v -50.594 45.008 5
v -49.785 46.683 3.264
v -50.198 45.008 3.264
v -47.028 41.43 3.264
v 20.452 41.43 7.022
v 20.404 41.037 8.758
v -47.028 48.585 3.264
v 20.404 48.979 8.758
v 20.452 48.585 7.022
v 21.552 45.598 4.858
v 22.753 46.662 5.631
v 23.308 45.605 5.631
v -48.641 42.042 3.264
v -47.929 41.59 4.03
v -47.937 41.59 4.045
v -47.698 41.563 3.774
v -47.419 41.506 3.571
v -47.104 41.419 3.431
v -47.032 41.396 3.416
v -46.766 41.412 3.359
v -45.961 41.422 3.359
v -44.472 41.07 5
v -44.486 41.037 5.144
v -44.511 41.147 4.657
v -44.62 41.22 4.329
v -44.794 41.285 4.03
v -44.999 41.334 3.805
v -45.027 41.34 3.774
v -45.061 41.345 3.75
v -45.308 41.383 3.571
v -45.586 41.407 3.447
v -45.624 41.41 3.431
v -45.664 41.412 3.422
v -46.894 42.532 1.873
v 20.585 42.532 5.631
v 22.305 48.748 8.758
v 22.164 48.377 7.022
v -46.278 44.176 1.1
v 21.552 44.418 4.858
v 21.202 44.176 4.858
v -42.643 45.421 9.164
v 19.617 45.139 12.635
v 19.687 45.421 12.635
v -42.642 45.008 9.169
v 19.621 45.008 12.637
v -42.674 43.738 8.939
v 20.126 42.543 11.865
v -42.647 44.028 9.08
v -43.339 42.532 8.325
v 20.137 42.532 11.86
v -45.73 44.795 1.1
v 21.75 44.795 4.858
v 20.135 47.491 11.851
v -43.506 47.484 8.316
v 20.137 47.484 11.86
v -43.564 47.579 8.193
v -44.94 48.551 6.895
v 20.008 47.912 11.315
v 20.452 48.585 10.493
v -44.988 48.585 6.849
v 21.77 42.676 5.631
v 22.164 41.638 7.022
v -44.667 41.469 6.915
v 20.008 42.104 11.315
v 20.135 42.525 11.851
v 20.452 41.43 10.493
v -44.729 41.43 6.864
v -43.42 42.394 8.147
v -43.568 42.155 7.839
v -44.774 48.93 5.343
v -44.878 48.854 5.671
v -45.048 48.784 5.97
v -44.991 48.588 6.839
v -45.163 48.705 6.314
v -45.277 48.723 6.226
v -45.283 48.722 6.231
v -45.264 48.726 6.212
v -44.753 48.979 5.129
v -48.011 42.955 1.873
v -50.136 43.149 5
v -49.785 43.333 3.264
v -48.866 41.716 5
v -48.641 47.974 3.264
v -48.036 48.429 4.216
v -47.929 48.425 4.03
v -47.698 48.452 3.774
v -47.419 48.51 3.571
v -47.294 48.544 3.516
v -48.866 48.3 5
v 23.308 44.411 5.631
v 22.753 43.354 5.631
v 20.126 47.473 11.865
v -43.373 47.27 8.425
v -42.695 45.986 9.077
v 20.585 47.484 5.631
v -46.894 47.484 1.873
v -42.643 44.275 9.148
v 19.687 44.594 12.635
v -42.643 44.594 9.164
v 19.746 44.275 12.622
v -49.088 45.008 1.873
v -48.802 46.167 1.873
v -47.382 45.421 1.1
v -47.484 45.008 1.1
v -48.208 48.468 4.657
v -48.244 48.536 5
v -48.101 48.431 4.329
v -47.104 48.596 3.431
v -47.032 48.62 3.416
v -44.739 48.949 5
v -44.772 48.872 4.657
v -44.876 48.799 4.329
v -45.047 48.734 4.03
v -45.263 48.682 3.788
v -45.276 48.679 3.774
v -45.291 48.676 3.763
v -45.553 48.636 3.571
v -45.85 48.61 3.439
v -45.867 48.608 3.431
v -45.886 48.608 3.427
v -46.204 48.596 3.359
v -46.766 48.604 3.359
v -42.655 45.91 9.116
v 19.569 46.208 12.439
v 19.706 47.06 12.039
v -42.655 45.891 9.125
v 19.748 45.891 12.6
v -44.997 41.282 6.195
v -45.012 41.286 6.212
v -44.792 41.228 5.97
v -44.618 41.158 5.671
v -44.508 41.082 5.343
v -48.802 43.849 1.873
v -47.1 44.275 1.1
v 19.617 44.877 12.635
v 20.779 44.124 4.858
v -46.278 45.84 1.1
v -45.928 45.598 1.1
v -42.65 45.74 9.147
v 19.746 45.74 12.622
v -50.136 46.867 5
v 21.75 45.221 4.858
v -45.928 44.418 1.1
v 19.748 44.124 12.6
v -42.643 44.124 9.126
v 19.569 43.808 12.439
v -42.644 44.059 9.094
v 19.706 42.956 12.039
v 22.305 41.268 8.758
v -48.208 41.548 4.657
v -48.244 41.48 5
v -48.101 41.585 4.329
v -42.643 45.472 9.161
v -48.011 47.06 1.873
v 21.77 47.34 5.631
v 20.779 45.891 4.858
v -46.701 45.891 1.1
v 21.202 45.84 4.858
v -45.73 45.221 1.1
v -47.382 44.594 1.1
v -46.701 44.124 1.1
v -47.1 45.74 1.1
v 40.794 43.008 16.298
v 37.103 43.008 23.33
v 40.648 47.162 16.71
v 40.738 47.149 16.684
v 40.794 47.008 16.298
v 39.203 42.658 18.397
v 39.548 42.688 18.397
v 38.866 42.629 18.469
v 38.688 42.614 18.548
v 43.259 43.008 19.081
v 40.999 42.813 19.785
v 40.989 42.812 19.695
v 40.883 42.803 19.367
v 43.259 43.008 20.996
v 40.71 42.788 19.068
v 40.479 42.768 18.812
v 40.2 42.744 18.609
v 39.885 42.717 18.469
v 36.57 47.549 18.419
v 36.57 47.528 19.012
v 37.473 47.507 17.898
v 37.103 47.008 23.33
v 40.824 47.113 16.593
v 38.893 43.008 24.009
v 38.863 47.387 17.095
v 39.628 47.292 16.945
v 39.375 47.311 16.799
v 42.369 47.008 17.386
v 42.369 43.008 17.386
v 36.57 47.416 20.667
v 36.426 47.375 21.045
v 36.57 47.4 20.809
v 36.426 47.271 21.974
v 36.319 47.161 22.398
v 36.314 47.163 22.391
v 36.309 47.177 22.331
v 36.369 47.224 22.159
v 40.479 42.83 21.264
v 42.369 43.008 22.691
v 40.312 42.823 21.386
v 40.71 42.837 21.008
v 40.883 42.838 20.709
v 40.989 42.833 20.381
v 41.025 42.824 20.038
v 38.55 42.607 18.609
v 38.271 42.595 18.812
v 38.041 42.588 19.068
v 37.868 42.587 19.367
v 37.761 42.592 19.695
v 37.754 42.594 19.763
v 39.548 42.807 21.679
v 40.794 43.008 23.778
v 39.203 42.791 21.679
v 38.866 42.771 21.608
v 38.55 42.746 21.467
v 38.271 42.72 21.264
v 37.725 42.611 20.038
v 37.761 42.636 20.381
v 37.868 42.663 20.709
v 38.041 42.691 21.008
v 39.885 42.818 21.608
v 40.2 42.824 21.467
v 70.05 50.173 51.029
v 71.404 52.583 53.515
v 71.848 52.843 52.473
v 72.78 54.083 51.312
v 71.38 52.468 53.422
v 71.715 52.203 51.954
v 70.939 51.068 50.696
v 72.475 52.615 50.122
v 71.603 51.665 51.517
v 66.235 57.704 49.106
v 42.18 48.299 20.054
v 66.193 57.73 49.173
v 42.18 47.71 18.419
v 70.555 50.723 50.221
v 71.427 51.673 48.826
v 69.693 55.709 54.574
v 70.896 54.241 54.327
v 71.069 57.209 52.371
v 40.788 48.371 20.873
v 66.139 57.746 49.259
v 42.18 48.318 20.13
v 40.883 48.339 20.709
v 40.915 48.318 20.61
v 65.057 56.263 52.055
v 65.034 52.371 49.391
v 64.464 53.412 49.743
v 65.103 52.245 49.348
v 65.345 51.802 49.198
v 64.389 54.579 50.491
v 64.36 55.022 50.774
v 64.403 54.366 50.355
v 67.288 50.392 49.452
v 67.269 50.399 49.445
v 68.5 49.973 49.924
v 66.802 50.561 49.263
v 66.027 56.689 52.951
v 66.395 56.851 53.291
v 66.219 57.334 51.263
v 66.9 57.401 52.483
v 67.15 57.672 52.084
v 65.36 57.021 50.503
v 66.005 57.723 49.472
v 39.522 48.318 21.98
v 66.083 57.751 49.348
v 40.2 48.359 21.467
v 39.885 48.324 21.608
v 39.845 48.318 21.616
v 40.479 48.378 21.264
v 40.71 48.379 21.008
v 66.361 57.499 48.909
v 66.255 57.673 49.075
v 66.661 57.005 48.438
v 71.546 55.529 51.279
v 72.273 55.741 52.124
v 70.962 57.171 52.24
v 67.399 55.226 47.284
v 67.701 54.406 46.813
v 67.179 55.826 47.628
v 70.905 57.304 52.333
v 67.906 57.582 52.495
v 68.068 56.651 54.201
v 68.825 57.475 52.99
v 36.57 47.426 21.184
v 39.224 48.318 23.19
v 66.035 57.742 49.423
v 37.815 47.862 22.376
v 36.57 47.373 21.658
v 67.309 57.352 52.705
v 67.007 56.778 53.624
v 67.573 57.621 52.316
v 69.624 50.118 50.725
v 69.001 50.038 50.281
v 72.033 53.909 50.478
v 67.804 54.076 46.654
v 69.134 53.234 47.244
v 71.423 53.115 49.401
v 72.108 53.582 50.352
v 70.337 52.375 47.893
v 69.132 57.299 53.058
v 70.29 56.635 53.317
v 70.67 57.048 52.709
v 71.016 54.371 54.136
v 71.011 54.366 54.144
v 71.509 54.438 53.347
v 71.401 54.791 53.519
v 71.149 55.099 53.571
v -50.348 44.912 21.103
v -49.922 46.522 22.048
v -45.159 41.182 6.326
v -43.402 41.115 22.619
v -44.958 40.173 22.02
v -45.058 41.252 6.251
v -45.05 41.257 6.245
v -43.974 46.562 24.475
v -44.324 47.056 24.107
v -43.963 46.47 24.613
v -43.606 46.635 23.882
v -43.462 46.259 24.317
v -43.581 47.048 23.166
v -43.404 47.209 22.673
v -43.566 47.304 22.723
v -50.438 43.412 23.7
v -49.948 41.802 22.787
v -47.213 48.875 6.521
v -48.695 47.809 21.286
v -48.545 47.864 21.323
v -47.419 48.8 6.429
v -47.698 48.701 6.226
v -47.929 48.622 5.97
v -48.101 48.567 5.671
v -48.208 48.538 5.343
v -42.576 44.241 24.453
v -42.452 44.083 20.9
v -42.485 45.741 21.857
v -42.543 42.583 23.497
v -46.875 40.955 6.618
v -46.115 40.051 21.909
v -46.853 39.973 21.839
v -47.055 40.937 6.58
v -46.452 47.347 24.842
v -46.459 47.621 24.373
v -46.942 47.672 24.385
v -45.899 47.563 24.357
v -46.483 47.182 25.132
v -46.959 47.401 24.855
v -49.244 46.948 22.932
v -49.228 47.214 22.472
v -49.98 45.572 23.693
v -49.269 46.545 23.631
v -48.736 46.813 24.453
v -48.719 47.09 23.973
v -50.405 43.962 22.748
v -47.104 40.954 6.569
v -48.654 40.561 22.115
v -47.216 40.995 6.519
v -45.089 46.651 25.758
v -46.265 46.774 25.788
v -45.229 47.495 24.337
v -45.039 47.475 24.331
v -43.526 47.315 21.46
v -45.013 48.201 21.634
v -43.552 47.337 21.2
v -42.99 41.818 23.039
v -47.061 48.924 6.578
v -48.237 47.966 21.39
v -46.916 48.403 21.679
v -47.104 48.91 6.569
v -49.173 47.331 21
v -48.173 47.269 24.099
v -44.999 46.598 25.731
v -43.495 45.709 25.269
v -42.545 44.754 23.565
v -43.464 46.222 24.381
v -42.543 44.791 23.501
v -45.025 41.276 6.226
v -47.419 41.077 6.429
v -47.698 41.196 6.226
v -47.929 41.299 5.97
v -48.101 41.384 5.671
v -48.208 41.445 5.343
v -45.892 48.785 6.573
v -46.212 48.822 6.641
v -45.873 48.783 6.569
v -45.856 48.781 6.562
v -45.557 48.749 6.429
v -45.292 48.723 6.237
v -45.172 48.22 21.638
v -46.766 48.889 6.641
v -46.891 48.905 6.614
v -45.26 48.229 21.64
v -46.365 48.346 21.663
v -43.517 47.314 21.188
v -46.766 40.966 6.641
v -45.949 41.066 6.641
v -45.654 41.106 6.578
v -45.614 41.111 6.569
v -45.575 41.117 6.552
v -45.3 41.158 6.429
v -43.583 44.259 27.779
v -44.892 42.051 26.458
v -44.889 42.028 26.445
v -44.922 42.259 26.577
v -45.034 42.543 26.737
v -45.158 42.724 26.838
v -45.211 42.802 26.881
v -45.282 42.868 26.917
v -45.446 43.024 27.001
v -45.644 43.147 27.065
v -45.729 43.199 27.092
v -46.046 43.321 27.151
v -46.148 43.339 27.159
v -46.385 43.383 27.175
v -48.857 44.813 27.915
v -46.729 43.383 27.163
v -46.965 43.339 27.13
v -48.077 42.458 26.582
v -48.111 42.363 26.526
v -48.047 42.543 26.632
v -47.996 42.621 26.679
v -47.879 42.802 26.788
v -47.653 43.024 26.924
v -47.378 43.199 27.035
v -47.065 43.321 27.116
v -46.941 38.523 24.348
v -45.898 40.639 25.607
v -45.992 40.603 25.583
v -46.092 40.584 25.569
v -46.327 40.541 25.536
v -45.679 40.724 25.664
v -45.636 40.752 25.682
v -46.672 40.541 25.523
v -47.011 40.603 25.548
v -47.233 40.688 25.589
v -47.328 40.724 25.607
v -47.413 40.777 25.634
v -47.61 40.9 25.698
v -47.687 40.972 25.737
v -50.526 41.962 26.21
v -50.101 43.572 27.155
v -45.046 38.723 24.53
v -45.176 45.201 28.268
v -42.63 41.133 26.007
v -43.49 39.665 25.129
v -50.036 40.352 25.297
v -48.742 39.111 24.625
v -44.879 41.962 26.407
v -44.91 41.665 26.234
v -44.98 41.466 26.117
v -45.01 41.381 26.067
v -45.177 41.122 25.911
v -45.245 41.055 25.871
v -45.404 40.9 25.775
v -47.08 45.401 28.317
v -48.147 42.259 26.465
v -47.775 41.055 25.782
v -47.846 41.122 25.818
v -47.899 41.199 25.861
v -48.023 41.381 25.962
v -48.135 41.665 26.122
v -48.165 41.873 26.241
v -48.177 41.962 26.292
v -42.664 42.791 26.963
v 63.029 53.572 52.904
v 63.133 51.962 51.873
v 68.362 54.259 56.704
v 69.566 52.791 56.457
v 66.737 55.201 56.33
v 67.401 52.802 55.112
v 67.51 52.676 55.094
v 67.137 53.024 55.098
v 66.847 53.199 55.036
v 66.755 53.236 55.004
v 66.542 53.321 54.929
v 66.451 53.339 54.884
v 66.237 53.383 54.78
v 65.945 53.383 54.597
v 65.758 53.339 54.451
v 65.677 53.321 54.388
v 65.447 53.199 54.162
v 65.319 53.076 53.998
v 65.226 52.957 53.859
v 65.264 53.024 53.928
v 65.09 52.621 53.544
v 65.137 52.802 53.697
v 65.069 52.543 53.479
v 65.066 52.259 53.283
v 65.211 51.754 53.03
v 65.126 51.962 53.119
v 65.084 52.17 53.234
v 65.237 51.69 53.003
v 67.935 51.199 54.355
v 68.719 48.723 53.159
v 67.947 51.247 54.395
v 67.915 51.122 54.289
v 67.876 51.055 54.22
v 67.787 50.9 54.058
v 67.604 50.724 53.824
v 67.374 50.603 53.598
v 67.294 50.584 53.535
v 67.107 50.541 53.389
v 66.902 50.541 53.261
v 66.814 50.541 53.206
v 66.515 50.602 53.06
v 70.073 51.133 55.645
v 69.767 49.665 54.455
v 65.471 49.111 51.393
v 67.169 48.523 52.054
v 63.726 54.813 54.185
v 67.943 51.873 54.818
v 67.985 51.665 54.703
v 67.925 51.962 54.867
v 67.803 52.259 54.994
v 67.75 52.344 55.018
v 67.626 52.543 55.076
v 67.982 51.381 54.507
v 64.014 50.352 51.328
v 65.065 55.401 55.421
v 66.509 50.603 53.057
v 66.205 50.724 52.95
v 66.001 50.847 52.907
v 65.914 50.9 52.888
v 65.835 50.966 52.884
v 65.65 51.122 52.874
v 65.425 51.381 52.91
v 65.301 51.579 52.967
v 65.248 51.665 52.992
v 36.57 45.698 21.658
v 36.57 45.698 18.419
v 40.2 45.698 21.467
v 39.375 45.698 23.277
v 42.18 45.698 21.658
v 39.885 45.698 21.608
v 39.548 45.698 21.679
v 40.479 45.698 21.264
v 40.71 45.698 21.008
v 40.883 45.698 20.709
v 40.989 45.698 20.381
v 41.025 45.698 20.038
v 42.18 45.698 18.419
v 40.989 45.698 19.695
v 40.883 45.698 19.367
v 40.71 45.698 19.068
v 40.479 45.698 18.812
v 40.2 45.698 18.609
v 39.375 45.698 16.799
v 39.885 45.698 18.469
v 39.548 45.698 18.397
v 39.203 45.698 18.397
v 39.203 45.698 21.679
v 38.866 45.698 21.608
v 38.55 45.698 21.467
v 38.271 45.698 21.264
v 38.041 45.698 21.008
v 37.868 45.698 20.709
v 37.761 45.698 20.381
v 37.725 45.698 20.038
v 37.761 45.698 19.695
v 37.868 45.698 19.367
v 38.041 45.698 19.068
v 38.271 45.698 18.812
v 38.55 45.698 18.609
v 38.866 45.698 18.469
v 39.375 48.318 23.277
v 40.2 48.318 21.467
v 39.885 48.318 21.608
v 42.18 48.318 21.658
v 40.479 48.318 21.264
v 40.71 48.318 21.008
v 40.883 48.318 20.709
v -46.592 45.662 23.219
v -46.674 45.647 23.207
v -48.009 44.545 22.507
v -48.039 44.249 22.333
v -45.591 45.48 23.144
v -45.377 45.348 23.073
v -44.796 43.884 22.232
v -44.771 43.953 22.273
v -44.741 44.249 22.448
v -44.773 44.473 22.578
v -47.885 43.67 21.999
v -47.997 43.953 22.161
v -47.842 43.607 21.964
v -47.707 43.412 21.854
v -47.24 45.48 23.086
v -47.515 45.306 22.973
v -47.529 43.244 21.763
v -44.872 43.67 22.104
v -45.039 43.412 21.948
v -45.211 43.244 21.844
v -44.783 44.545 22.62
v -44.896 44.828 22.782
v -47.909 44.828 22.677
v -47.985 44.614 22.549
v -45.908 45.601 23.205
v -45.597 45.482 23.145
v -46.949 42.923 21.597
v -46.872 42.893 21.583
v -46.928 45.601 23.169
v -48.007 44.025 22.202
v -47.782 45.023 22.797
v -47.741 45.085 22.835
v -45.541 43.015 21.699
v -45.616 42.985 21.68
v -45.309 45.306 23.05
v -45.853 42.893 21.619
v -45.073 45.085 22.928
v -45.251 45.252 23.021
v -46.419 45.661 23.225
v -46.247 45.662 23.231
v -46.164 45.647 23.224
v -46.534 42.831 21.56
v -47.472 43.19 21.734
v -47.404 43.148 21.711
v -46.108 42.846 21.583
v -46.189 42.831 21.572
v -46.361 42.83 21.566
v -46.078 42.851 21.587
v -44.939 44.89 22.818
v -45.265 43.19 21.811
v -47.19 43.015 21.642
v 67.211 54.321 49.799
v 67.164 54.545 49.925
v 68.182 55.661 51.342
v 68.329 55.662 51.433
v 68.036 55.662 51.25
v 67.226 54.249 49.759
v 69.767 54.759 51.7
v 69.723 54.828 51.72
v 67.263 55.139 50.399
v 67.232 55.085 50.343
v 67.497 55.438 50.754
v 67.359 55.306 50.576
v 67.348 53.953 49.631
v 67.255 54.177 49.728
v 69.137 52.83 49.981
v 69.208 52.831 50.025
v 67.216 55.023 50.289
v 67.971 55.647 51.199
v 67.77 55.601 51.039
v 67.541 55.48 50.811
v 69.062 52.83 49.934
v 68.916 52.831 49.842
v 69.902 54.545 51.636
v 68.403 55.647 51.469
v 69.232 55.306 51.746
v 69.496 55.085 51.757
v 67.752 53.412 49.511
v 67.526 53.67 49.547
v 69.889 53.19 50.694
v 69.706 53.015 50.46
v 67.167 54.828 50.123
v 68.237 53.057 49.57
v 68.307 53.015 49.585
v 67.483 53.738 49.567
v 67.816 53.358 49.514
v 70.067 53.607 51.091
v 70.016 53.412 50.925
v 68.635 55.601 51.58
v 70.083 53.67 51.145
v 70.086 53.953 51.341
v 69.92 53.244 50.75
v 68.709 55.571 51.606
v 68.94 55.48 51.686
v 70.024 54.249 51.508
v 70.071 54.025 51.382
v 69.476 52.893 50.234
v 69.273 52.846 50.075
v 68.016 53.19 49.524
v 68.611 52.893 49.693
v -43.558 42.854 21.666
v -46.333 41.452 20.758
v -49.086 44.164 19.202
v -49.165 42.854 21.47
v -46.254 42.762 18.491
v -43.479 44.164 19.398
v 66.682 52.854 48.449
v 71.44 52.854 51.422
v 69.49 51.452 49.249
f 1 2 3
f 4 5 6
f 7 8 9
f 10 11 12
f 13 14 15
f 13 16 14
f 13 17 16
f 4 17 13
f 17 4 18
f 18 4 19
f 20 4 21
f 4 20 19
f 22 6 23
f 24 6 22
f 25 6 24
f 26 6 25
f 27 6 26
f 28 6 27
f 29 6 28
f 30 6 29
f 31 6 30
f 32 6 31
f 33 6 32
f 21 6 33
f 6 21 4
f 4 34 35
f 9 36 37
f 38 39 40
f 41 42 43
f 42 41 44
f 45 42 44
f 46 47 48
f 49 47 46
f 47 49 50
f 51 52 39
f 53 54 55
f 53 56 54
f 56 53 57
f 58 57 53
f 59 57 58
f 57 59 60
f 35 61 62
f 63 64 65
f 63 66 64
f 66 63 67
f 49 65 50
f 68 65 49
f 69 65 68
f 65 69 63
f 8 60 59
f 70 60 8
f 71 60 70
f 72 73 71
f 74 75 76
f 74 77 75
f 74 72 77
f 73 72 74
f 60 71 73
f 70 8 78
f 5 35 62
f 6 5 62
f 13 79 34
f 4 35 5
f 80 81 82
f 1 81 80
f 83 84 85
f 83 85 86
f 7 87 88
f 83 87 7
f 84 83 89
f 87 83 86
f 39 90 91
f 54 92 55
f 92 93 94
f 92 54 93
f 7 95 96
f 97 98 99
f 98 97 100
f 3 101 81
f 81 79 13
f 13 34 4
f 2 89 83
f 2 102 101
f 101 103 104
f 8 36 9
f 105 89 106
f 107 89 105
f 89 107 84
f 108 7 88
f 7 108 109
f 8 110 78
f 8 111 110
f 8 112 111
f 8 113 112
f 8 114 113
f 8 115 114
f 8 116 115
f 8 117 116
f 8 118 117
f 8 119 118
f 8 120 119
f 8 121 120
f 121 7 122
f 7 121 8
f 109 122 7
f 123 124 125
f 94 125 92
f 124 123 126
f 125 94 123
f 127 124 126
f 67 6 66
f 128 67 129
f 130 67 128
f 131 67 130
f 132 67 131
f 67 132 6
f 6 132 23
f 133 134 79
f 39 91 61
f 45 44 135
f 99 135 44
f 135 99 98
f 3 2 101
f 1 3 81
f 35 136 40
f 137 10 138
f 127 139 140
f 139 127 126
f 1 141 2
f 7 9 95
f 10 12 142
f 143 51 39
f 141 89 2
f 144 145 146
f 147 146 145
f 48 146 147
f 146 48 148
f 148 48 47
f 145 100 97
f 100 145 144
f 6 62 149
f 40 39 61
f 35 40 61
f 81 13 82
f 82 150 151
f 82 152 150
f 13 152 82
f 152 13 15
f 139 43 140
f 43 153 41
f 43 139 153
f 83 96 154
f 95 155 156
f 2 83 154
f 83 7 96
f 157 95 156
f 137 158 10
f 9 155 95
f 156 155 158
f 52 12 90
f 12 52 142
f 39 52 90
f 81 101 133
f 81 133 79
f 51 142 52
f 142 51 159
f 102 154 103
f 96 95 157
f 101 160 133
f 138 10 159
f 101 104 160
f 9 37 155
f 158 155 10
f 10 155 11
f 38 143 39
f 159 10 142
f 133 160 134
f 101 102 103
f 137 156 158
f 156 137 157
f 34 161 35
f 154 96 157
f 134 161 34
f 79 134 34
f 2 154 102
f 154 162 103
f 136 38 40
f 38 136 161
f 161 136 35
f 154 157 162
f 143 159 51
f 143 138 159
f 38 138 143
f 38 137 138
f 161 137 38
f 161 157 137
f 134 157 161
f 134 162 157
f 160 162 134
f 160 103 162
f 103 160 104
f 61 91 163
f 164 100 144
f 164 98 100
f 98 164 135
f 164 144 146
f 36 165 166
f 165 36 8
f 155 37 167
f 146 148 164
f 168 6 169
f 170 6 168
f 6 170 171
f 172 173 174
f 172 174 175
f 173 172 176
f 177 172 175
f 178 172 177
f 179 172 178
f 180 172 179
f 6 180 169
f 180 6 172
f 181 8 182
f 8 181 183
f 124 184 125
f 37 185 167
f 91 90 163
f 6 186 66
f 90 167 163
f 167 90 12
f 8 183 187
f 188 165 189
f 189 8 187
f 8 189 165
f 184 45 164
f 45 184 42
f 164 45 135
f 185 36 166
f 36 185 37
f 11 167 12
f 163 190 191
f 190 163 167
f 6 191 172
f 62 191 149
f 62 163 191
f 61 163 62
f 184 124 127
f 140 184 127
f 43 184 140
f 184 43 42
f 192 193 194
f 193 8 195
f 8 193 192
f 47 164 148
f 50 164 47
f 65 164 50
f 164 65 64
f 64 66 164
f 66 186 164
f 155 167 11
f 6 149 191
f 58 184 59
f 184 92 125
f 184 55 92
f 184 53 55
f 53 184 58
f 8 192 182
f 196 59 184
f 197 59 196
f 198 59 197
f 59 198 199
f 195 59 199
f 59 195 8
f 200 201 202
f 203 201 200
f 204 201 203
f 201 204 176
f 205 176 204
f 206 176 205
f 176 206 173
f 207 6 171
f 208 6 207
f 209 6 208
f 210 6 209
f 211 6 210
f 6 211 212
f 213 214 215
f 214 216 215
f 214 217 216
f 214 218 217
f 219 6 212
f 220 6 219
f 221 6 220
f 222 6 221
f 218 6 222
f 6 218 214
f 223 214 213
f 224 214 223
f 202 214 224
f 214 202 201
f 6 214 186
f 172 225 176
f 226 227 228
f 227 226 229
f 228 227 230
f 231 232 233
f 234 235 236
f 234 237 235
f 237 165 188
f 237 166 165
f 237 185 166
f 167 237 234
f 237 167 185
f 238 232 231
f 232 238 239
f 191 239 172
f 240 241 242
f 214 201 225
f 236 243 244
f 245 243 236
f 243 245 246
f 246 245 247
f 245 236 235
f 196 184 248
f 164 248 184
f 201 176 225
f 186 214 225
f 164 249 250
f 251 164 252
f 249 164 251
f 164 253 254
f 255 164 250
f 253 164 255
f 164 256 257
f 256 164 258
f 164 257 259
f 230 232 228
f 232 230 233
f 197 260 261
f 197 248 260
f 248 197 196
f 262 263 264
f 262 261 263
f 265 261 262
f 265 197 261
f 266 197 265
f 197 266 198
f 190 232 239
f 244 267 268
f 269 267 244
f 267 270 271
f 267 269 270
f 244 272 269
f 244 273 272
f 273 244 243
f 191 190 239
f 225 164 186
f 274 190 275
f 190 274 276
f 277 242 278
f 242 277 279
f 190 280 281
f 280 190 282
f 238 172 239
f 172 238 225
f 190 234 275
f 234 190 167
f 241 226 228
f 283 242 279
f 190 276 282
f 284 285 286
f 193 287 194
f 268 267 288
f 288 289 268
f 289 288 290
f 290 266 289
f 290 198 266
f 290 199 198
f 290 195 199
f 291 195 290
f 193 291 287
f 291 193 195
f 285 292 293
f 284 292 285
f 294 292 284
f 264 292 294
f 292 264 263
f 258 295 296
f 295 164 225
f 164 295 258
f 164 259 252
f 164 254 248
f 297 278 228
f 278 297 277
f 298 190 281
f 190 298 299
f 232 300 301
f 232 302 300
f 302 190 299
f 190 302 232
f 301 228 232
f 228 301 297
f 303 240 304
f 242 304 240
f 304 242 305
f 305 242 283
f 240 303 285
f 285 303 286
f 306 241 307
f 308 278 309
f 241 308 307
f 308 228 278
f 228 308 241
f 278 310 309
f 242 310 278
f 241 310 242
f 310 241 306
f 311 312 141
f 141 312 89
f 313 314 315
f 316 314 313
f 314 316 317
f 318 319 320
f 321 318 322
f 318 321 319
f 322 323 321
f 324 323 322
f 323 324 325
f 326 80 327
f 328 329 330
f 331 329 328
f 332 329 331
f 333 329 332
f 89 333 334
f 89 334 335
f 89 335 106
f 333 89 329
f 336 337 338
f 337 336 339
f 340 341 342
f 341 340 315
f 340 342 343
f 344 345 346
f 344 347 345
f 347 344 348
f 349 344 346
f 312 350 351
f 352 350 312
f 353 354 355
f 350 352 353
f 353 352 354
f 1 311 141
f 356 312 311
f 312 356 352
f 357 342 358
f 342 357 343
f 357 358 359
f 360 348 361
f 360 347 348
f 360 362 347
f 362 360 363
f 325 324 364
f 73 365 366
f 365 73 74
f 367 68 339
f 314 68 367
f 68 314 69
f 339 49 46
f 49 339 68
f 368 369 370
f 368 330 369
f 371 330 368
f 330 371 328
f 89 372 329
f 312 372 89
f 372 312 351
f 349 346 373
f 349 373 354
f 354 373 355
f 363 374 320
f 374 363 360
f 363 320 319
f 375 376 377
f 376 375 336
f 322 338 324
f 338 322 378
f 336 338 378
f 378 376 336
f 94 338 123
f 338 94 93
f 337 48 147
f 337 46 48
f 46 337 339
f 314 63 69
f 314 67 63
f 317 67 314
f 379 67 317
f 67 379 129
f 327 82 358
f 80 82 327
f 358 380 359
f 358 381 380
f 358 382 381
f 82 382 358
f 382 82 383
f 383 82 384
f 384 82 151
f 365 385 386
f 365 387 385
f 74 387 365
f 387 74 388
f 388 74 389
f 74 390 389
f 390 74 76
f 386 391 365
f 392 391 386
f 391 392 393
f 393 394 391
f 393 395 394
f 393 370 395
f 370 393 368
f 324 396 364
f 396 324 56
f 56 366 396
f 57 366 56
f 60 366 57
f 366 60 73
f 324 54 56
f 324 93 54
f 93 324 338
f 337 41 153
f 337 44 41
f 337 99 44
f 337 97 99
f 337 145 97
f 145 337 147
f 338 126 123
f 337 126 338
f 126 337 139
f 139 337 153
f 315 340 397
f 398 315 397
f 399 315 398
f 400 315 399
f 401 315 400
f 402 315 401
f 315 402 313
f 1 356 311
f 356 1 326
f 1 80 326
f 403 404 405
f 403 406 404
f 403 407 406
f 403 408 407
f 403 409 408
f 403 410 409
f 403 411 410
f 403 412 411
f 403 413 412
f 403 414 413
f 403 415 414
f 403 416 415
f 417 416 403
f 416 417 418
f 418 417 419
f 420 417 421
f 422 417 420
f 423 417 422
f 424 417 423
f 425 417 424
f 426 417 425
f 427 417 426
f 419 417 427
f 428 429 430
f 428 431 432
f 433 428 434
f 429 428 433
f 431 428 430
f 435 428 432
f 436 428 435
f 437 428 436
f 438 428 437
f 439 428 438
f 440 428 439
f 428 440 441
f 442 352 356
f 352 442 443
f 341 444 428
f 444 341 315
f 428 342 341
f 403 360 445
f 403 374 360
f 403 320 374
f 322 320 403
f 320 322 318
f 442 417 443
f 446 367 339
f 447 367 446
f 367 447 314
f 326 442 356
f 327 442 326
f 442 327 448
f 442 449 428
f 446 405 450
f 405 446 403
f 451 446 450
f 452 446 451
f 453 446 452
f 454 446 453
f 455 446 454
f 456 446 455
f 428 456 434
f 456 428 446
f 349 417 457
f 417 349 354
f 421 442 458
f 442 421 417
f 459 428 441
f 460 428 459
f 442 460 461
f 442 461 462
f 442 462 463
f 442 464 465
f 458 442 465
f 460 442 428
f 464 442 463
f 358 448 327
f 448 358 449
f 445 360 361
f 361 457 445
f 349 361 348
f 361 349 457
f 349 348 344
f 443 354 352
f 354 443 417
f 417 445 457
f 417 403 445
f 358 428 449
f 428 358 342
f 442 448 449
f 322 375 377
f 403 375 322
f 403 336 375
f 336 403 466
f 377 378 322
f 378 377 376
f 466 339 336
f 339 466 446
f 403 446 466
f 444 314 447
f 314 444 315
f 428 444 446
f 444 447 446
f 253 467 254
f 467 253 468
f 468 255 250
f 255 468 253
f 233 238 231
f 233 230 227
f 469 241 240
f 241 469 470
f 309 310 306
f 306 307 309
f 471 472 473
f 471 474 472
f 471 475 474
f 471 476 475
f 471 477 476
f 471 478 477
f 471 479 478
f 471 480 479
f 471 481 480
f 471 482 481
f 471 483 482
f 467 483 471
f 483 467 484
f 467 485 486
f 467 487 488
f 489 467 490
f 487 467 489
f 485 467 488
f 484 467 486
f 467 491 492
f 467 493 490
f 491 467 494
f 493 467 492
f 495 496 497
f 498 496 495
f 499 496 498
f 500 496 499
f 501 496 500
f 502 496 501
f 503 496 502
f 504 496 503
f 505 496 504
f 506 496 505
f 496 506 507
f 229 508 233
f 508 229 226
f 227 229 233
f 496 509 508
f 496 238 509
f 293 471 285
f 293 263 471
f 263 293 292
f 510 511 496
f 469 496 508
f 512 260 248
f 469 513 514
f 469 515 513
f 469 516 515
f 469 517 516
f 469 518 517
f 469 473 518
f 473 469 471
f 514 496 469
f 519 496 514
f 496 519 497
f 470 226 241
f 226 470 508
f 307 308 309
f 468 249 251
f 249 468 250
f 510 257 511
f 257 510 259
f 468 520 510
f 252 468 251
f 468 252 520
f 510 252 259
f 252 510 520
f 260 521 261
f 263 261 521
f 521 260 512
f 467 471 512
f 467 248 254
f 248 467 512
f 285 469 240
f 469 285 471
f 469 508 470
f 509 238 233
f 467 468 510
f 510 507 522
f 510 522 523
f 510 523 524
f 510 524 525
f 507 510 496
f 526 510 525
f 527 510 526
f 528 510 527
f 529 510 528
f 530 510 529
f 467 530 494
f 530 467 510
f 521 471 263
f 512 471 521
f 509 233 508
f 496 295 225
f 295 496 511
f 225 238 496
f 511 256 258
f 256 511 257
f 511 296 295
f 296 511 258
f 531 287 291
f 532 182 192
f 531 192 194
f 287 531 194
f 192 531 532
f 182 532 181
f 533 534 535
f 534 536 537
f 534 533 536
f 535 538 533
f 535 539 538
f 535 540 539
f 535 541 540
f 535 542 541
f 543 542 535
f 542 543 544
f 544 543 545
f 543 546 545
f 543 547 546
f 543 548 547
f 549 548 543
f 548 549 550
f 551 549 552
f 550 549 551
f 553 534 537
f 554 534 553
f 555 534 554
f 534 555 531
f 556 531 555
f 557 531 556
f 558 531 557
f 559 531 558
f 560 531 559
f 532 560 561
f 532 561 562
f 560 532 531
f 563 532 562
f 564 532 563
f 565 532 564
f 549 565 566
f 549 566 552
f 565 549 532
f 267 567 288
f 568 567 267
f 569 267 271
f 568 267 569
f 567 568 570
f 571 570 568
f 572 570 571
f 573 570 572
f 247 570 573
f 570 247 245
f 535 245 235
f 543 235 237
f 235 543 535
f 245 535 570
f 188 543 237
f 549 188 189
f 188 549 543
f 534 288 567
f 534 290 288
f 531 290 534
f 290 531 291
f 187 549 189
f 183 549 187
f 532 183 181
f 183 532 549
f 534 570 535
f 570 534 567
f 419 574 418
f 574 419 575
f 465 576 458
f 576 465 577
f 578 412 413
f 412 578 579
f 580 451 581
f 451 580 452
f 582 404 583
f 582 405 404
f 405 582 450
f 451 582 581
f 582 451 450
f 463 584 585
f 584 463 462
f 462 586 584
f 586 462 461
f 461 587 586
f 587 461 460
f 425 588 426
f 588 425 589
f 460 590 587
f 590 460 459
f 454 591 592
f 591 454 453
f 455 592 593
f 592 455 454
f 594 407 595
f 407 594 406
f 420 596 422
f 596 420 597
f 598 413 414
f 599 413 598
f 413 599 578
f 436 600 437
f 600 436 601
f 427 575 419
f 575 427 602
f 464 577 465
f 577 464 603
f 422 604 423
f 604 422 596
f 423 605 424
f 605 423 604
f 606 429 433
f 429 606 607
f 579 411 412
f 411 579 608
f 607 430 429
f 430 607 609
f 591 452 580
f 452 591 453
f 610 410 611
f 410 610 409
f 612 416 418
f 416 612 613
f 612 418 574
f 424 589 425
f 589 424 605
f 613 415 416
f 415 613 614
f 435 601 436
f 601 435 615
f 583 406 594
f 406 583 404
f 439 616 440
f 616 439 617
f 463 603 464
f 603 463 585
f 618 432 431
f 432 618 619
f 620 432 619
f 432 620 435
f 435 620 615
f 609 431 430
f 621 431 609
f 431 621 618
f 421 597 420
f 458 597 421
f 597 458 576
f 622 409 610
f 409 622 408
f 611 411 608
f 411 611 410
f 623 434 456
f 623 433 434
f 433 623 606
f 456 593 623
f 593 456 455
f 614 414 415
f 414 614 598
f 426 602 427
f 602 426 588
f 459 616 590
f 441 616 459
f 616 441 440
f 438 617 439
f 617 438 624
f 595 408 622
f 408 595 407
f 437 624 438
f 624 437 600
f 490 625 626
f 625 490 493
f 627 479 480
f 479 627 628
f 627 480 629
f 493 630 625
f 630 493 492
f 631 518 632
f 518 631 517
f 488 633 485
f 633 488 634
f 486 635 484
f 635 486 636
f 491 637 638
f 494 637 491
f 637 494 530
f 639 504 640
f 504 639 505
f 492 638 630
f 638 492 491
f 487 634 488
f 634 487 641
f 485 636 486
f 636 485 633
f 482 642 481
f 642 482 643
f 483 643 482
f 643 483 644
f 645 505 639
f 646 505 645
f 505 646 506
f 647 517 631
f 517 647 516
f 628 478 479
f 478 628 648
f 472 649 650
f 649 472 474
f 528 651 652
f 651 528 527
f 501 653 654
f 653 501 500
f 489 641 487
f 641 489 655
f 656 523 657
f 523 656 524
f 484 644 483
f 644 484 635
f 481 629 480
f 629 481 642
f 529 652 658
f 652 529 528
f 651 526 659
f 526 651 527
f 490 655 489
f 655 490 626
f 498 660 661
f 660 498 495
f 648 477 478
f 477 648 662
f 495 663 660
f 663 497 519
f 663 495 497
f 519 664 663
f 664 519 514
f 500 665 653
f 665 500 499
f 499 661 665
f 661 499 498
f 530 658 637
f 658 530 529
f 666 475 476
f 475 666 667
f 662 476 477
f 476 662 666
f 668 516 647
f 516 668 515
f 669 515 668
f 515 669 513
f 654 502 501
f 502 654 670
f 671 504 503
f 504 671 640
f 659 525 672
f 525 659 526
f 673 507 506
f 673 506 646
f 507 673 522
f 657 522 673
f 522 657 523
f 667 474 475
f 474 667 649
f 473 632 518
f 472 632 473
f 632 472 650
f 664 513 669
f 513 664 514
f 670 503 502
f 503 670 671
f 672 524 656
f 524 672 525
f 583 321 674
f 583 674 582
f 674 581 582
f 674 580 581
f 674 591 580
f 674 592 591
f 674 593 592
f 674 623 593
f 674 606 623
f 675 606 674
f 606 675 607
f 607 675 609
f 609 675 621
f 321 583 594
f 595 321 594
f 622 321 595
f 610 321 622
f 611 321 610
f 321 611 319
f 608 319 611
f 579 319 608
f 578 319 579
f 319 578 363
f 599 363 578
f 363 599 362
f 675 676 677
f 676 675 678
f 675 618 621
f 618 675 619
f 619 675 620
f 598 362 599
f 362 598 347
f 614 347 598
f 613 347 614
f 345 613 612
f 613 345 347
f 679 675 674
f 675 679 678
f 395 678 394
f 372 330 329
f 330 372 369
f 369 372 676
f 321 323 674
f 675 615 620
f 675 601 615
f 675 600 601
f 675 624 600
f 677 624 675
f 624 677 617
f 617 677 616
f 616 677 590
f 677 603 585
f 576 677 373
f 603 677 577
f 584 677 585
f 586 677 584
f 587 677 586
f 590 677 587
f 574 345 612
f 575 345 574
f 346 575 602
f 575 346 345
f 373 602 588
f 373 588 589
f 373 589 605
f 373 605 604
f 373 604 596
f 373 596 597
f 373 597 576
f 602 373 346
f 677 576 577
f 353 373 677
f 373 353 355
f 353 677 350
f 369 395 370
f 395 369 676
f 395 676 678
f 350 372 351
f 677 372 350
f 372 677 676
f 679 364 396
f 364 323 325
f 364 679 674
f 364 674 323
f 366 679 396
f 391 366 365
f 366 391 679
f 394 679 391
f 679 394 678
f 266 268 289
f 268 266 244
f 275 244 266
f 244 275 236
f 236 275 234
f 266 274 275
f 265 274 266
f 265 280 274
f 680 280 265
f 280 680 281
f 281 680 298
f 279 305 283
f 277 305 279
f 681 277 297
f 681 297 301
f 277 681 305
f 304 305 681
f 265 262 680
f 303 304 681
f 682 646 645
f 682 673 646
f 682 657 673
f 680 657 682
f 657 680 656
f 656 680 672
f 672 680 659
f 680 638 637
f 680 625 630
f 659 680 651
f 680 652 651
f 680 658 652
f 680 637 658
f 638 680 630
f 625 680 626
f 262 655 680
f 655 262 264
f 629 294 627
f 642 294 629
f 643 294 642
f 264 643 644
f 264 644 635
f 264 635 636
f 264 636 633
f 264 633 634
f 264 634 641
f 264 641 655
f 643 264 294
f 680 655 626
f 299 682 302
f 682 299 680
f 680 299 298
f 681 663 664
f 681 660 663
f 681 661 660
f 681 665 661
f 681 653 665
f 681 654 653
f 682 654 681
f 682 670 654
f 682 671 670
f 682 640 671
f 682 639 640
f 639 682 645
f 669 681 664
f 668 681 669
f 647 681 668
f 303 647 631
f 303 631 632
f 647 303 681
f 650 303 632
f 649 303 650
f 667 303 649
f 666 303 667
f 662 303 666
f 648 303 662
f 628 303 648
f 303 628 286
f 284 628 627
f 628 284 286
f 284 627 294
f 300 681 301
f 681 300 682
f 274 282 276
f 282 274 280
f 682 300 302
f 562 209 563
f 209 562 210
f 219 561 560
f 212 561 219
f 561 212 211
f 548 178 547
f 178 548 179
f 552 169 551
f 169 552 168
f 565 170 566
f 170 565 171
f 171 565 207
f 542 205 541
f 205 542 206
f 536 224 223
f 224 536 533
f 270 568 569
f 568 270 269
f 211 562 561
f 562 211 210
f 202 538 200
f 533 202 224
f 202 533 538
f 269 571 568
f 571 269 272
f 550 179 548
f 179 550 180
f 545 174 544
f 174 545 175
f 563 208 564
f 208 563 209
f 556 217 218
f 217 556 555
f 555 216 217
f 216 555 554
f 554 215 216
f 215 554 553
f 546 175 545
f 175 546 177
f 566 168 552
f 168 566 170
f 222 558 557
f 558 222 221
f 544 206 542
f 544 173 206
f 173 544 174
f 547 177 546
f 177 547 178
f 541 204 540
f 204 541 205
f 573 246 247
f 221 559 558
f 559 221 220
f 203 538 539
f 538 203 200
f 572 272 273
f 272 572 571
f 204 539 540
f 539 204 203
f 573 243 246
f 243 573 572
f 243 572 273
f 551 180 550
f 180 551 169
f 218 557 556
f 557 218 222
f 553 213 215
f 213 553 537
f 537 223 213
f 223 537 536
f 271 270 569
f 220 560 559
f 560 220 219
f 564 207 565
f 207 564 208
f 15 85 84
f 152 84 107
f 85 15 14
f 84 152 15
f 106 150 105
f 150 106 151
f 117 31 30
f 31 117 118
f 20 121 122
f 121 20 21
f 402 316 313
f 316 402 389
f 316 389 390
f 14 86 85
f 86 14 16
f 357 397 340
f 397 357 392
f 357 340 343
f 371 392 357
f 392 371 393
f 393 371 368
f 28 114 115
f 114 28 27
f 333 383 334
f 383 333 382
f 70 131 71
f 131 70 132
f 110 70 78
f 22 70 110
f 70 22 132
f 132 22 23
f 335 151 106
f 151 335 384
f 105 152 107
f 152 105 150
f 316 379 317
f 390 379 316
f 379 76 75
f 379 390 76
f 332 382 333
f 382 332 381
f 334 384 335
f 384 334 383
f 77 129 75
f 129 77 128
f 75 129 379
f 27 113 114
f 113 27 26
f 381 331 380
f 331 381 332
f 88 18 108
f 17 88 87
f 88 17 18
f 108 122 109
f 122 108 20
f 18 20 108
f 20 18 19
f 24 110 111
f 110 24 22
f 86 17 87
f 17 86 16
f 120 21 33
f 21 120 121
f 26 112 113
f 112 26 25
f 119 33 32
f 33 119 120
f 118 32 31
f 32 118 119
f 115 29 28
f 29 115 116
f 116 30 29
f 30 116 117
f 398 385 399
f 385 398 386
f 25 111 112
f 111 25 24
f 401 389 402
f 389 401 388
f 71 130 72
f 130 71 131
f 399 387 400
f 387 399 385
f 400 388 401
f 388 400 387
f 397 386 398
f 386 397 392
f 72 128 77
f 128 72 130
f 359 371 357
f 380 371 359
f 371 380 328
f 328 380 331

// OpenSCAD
mirror ([-1, 0, 0]) {
  difference () {
    union () {

      hull () {
        translate ([46.59388020145215, 45.007811226975086, 5.0]) {
          sphere (r=4);
        }
        translate ([0, 0, 8]) {
          rotate (a=12.0, v=[0, 1, 0]) {
            translate ([0, -12, 5.64]) {
              translate ([0, 0, 236.2124823694608]) {
                rotate (a=-10.0, v=[0, 1, 0]) {
                  translate ([0, 0, -236.2124823694608]) {
                    translate ([0, 0, 84.31095110414394]) {
                      rotate (a=29.999999999999996, v=[1, 0, 0]) {
                        translate ([3.8625, 0, -84.31095110414394]) {
                          translate ([0, 0, -4.5]) {
                            translate ([0, 13.575, 0]) {
                              cylinder (h=3, r=4, center=true);
                            }
                          }
                        }
                      }
                    }
                  }
                }
              }
            }
          }
        }
      }
      translate ([0, 0, 8]) {
        rotate (a=12.0, v=[0, 1, 0]) {
          translate ([0, -12, 5.64]) {
            translate ([0, 0, 236.2124823694608]) {
              rotate (a=-10.0, v=[0, 1, 0]) {
                translate ([0, 0, -236.2124823694608]) {
                  translate ([0, 0, 84.31095110414394]) {
                    rotate (a=29.999999999999996, v=[1, 0, 0]) {
                      translate ([3.8625, 0, -84.31095110414394]) {
                        translate ([0, 0, -2.0999999999999996]) {
                          translate ([0, 13.575, 0]) {
                            cylinder (h=4, r=4, center=true);
                          }
                        }
                      }
                    }
                  }
                }
              }
            }
          }
        }
      }
      union () {
        hull () {
          translate ([46.59388020145215, 45.007811226975086, 5.0]) {
            sphere (r=4);
          }
          translate ([-20.8861121541338, 45.007811226975086, 8.757888382012283]) {
            sphere (r=4);
          }
        }
        hull () {
          translate ([-20.8861121541338, 45.007811226975086, 8.757888382012283]) {
            sphere (r=4);
          }
          translate ([-39.37541674104513, 45.007811226975086, 20.03827299295847]) {
            rotate (a=90.0, v=[1, 0, 0]) {
              cylinder (h=4, r=4, center=true);
            }
          }
        }
        hull () {
          translate ([-39.37541674104513, 45.007811226975086, 20.03827299295847]) {
            rotate (a=90.0, v=[1, 0, 0]) {
              cylinder (h=4, r=4, center=true);
            }
          }
          translate ([0, 0, 8]) {
            rotate (a=12.0, v=[0, 1, 0]) {
              translate ([0, -2, 0]) {
                translate ([0, 0, 236.2124823694608]) {
                  rotate (a=20.0, v=[0, 1, 0]) {
                    translate ([0, 0, -236.2124823694608]) {
                      translate ([0, 0, 84.31095110414394]) {
                        rotate (a=29.999999999999996, v=[1, 0, 0]) {
                          translate ([0, 0, -84.31095110414394]) {
                            translate ([0, 0, -4.5]) {
                              translate ([0, 13.575, 0]) {
                                cylinder (h=3, r=4, center=true);
                              }
                            }
                          }
                        }
                      }
                    }
                  }
                }
              }
            }
          }
        }
      }
      translate ([0, 0, 8]) {
        rotate (a=12.0, v=[0, 1, 0]) {
          translate ([0, -2, 0]) {
            translate ([0, 0, 236.2124823694608]) {
              rotate (a=20.0, v=[0, 1, 0]) {
                translate ([0, 0, -236.2124823694608]) {
                  translate ([0, 0, 84.31095110414394]) {
                    rotate (a=29.999999999999996, v=[1, 0, 0]) {
                      translate ([0, 0, -84.31095110414394]) {
                        translate ([0, 0, -2.0999999999999996]) {
                          translate ([0, 13.575, 0]) {
                            cylinder (h=4, r=4, center=true);
                          }
                        }
                      }
                    }
                  }
                }
              }
            }
          }
        }
      }


    }
    union () {
      translate ([0, 0, 8]) {
        rotate (a=12.0, v=[0, 1, 0]) {
          translate ([0, -12, 5.64]) {
            translate ([0, 0, 236.2124823694608]) {
              rotate (a=-10.0, v=[0, 1, 0]) {
                translate ([0, 0, -236.2124823694608]) {
                  translate ([0, 0, 84.31095110414394]) {
                    rotate (a=-29.999999999999996, v=[1, 0, 0]) {
                      translate ([0, 0, -84.31095110414394]) {
                        translate ([0, 0, -2.0999999999999996]) {
                          translate ([0, -13.575, 0]) {
                            cylinder ($fn=30, h=10, r=1.65, center=true);
                          }
                        }
                      }
                    }
                  }
                }
              }
            }
          }
        }
      }
      translate ([0, 0, 8]) {
        rotate (a=12.0, v=[0, 1, 0]) {
          translate ([0, -12, 5.64]) {
            translate ([0, 0, 236.2124823694608]) {
              rotate (a=-10.0, v=[0, 1, 0]) {
                translate ([0, 0, -236.2124823694608]) {
                  translate ([0, 0, 84.31095110414394]) {
                    rotate (a=29.999999999999996, v=[1, 0, 0]) {
                      translate ([3.8625, 0, -84.31095110414394]) {
                        translate ([0, 0, -2.0999999999999996]) {
                          translate ([0, 13.575, 0]) {
                            cylinder ($fn=30, h=10, r=1.65, center=true);
                          }
                        }
                      }
                    }
                  }
                }
              }
            }
          }
        }
      }
      translate ([0, 0, 8]) {
        rotate (a=12.0, v=[0, 1, 0]) {
          translate ([0, -2, 0]) {
            translate ([0, 0, 236.2124823694608]) {
              rotate (a=20.0, v=[0, 1, 0]) {
                translate ([0, 0, -236.2124823694608]) {
                  translate ([0, 0, 84.31095110414394]) {
                    rotate (a=29.999999999999996, v=[1, 0, 0]) {
                      translate ([0, 0, -84.31095110414394]) {
                        translate ([0, 0, -2.0999999999999996]) {
                          translate ([0, 13.575, 0]) {
                            cylinder ($fn=30, h=10, r=1.65, center=true);
                          }
                        }
                      }
                    }
                  }
                }
              }
            }
          }
        }
      }
      translate ([0, 0, 8]) {
        rotate (a=12.0, v=[0, 1, 0]) {
          translate ([0, 0, 0]) {
            translate ([0, 0, 236.2124823694608]) {
              rotate (a=10.0, v=[0, 1, 0]) {
                translate ([0, 0, -236.2124823694608]) {
                  translate ([0, 0, 84.31095110414394]) {
                    rotate (a=-14.999999999999998, v=[1, 0, 0]) {
                      translate ([0, 0, -84.31095110414394]) {
                        translate ([0, 0, -2.0999999999999996]) {
                          translate ([0, -13.575, 0]) {
                            cylinder ($fn=30, h=10, r=1.65, center=true);
                          }
                        }
                      }
                    }
                  }
                }
              }
            }
          }
        }
      }
      translate ([0, 0, 8]) {
        rotate (a=12.0, v=[0, 1, 0]) {
          translate ([0, -12, 5.64]) {
            translate ([0, 0, 236.2124823694608]) {
              rotate (a=-10.0, v=[0, 1, 0]) {
                translate ([0, 0, -236.2124823694608]) {
                  translate ([0, 0, 84.31095110414394]) {
                    rotate (a=29.999999999999996, v=[1, 0, 0]) {
                      translate ([3.8625, 0, -84.31095110414394]) {
                        hull () {
                          translate ([0, 0, -6]) {
                            translate ([0, 28.575, 0]) {
                              union () {
                                cube ([5.81, 3.3544050639917264, 2.82], center=true);
                                rotate (a=59.99999999999999, v=[0, 0, 1]) {
                                  cube ([5.81, 3.3544050639917264, 2.82], center=true);
                                }
                                rotate (a=-59.99999999999999, v=[0, 0, 1]) {
                                  cube ([5.81, 3.3544050639917264, 2.82], center=true);
                                }
                              }
                            }
                          }
                          translate ([0, 0, -6]) {
                            translate ([0, 13.575, 0]) {
                              union () {
                                cube ([5.609999999999999, 3.238935010153801, 2.6199999999999997], center=true);
                                rotate (a=59.99999999999999, v=[0, 0, 1]) {
                                  cube ([5.609999999999999, 3.238935010153801, 2.6199999999999997], center=true);
                                }
                                rotate (a=-59.99999999999999, v=[0, 0, 1]) {
                                  cube ([5.609999999999999, 3.238935010153801, 2.6199999999999997], center=true);
                                }
                              }
                            }
                          }
                        }
                      }
                    }
                  }
                }
              }
            }
          }
        }
      }
      translate ([0, 0, 8]) {
        rotate (a=12.0, v=[0, 1, 0]) {
          translate ([0, -12, 5.64]) {
            translate ([0, 0, 236.2124823694608]) {
              rotate (a=-10.0, v=[0, 1, 0]) {
                translate ([0, 0, -236.2124823694608]) {
                  translate ([0, 0, 84.31095110414394]) {
                    rotate (a=-29.999999999999996, v=[1, 0, 0]) {
                      translate ([0, 0, -84.31095110414394]) {
                        hull () {
                          translate ([0, 0, -6]) {
                            translate ([0, -28.575, 0]) {
                              union () {
                                cube ([5.81, 3.3544050639917264, 2.82], center=true);
                                rotate (a=59.99999999999999, v=[0, 0, 1]) {
                                  cube ([5.81, 3.3544050639917264, 2.82], center=true);
                                }
                                rotate (a=-59.99999999999999, v=[0, 0, 1]) {
                                  cube ([5.81, 3.3544050639917264, 2.82], center=true);
                                }
                              }
                            }
                          }
                          translate ([0, 0, -6]) {
                            translate ([0, -13.575, 0]) {
                              union () {
                                cube ([5.609999999999999, 3.238935010153801, 2.6199999999999997], center=true);
                                rotate (a=59.99999999999999, v=[0, 0, 1]) {
                                  cube ([5.609999999999999, 3.238935010153801, 2.6199999999999997], center=true);
                                }
                                rotate (a=-59.99999999999999, v=[0, 0, 1]) {
                                  cube ([5.609999999999999, 3.238935010153801, 2.6199999999999997], center=true);
                                }
                              }
                            }
                          }
                        }
                      }
                    }
                  }
                }
              }
            }
          }
        }
      }
      translate ([0, 0, 8]) {
        rotate (a=12.0, v=[0, 1, 0]) {
          translate ([0, -2, 0]) {
            translate ([0, 0, 236.2124823694608]) {
              rotate (a=20.0, v=[0, 1, 0]) {
                translate ([0, 0, -236.2124823694608]) {
                  translate ([0, 0, 84.31095110414394]) {
                    rotate (a=29.999999999999996, v=[1, 0, 0]) {
                      translate ([0, 0, -84.31095110414394]) {
                        hull () {
                          translate ([0, 0, -6]) {
                            translate ([0, 28.575, 0]) {
                              union () {
                                cube ([5.81, 3.3544050639917264, 2.82], center=true);
                                rotate (a=59.99999999999999, v=[0, 0, 1]) {
                                  cube ([5.81, 3.3544050639917264, 2.82], center=true);
                                }
                                rotate (a=-59.99999999999999, v=[0, 0, 1]) {
                                  cube ([5.81, 3.3544050639917264, 2.82], center=true);
                                }
                              }
                            }
                          }
                          translate ([0, 0, -6]) {
                            translate ([0, 13.575, 0]) {
                              union () {
                                cube ([5.609999999999999, 3.238935010153801, 2.6199999999999997], center=true);
                                rotate (a=59.99999999999999, v=[0, 0, 1]) {
                                  cube ([5.609999999999999, 3.238935010153801, 2.6199999999999997], center=true);
                                }
                                rotate (a=-59.99999999999999, v=[0, 0, 1]) {
                                  cube ([5.609999999999999, 3.238935010153801, 2.6199999999999997], center=true);
                                }
                              }
                            }
                          }
                        }
                      }
                    }
                  }
                }
              }
            }
          }
        }
      }
      translate ([0, 0, 8]) {
        rotate (a=12.0, v=[0, 1, 0]) {
          translate ([0, 0, 0]) {
            translate ([0, 0, 236.2124823694608]) {
              rotate (a=10.0, v=[0, 1, 0]) {
                translate ([0, 0, -236.2124823694608]) {
                  translate ([0, 0, 84.31095110414394]) {
                    rotate (a=-14.999999999999998, v=[1, 0, 0]) {
                      translate ([0, 0, -84.31095110414394]) {
                        hull () {
                          translate ([0, 0, -6]) {
                            translate ([0, -28.575, 0]) {
                              union () {
                                cube ([5.81, 3.3544050639917264, 2.82], center=true);
                                rotate (a=59.99999999999999, v=[0, 0, 1]) {
                                  cube ([5.81, 3.3544050639917264, 2.82], center=true);
                                }
                                rotate (a=-59.99999999999999, v=[0, 0, 1]) {
                                  cube ([5.81, 3.3544050639917264, 2.82], center=true);
                                }
                              }
                            }
                          }
                          translate ([0, 0, -6]) {
                            translate ([0, -13.575, 0]) {
                              union () {
                                cube ([5.609999999999999, 3.238935010153801, 2.6199999999999997], center=true);
                                rotate (a=59.99999999999999, v=[0, 0, 1]) {
                                  cube ([5.609999999999999, 3.238935010153801, 2.6199999999999997], center=true);
                                }
                                rotate (a=-59.99999999999999, v=[0, 0, 1]) {
                                  cube ([5.609999999999999, 3.238935010153801, 2.6199999999999997], center=true);
                                }
                              }
                            }
                          }
                        }
                      }
                    }
                  }
                }
              }
            }
          }
        }
      }
      translate ([0, 2, 0]) {
        translate ([-39.37541674104513, 45.007811226975086, 20.03827299295847]) {
          rotate (a=90.0, v=[1, 0, 0]) {
            union () {
              cube ([5.609999999999999, 3.238935010153801, 2.6199999999999997], center=true);
              rotate (a=59.99999999999999, v=[0, 0, 1]) {
                cube ([5.609999999999999, 3.238935010153801, 2.6199999999999997], center=true);
              }
              rotate (a=-59.99999999999999, v=[0, 0, 1]) {
                cube ([5.609999999999999, 3.238935010153801, 2.6199999999999997], center=true);
              }
            }
          }
        }
      }
      translate ([0, -3.0, 0]) {
        translate ([-39.37541674104513, -34.50390561348755, 10.038272992958468]) {
          rotate (a=-90.0, v=[1, 0, 0]) {
            union () {
              cube ([5.609999999999999, 3.238935010153801, 2.6199999999999997], center=true);
              rotate (a=59.99999999999999, v=[0, 0, 1]) {
                cube ([5.609999999999999, 3.238935010153801, 2.6199999999999997], center=true);
              }
              rotate (a=-59.99999999999999, v=[0, 0, 1]) {
                cube ([5.609999999999999, 3.238935010153801, 2.6199999999999997], center=true);
              }
            }
          }
        }
      }
      hull () {
        translate ([-39.37541674104513, 45.007811226975086, 20.03827299295847]) {
          rotate (a=90.0, v=[1, 0, 0]) {
            cylinder ($fn=30, h=20, r=1.65, center=true);
          }
        }
    } hull() {
        translate ([-39.37541674104513, -34.50390561348755, 10.038272992958468]) {
          rotate (a=90.0, v=[1, 0, 0]) {
            cylinder ($fn=30, h=20, r=1.65, center=true);
          }
        }
      }
      hull () {
        translate ([46.59388020145215, 45.007811226975086, 5.0]) {
          rotate (a=90.0, v=[1, 0, 0]) {
            cylinder ($fn=30, h=20, r=1.65, center=true);
          }
        }
        translate ([42.73373313209089, -69.0078112269751, 5.0]) {
          rotate (a=90.0, v=[1, 0, 0]) {
            cylinder ($fn=30, h=20, r=1.65, center=true);
          }
        }
      }
    }
  }
}
